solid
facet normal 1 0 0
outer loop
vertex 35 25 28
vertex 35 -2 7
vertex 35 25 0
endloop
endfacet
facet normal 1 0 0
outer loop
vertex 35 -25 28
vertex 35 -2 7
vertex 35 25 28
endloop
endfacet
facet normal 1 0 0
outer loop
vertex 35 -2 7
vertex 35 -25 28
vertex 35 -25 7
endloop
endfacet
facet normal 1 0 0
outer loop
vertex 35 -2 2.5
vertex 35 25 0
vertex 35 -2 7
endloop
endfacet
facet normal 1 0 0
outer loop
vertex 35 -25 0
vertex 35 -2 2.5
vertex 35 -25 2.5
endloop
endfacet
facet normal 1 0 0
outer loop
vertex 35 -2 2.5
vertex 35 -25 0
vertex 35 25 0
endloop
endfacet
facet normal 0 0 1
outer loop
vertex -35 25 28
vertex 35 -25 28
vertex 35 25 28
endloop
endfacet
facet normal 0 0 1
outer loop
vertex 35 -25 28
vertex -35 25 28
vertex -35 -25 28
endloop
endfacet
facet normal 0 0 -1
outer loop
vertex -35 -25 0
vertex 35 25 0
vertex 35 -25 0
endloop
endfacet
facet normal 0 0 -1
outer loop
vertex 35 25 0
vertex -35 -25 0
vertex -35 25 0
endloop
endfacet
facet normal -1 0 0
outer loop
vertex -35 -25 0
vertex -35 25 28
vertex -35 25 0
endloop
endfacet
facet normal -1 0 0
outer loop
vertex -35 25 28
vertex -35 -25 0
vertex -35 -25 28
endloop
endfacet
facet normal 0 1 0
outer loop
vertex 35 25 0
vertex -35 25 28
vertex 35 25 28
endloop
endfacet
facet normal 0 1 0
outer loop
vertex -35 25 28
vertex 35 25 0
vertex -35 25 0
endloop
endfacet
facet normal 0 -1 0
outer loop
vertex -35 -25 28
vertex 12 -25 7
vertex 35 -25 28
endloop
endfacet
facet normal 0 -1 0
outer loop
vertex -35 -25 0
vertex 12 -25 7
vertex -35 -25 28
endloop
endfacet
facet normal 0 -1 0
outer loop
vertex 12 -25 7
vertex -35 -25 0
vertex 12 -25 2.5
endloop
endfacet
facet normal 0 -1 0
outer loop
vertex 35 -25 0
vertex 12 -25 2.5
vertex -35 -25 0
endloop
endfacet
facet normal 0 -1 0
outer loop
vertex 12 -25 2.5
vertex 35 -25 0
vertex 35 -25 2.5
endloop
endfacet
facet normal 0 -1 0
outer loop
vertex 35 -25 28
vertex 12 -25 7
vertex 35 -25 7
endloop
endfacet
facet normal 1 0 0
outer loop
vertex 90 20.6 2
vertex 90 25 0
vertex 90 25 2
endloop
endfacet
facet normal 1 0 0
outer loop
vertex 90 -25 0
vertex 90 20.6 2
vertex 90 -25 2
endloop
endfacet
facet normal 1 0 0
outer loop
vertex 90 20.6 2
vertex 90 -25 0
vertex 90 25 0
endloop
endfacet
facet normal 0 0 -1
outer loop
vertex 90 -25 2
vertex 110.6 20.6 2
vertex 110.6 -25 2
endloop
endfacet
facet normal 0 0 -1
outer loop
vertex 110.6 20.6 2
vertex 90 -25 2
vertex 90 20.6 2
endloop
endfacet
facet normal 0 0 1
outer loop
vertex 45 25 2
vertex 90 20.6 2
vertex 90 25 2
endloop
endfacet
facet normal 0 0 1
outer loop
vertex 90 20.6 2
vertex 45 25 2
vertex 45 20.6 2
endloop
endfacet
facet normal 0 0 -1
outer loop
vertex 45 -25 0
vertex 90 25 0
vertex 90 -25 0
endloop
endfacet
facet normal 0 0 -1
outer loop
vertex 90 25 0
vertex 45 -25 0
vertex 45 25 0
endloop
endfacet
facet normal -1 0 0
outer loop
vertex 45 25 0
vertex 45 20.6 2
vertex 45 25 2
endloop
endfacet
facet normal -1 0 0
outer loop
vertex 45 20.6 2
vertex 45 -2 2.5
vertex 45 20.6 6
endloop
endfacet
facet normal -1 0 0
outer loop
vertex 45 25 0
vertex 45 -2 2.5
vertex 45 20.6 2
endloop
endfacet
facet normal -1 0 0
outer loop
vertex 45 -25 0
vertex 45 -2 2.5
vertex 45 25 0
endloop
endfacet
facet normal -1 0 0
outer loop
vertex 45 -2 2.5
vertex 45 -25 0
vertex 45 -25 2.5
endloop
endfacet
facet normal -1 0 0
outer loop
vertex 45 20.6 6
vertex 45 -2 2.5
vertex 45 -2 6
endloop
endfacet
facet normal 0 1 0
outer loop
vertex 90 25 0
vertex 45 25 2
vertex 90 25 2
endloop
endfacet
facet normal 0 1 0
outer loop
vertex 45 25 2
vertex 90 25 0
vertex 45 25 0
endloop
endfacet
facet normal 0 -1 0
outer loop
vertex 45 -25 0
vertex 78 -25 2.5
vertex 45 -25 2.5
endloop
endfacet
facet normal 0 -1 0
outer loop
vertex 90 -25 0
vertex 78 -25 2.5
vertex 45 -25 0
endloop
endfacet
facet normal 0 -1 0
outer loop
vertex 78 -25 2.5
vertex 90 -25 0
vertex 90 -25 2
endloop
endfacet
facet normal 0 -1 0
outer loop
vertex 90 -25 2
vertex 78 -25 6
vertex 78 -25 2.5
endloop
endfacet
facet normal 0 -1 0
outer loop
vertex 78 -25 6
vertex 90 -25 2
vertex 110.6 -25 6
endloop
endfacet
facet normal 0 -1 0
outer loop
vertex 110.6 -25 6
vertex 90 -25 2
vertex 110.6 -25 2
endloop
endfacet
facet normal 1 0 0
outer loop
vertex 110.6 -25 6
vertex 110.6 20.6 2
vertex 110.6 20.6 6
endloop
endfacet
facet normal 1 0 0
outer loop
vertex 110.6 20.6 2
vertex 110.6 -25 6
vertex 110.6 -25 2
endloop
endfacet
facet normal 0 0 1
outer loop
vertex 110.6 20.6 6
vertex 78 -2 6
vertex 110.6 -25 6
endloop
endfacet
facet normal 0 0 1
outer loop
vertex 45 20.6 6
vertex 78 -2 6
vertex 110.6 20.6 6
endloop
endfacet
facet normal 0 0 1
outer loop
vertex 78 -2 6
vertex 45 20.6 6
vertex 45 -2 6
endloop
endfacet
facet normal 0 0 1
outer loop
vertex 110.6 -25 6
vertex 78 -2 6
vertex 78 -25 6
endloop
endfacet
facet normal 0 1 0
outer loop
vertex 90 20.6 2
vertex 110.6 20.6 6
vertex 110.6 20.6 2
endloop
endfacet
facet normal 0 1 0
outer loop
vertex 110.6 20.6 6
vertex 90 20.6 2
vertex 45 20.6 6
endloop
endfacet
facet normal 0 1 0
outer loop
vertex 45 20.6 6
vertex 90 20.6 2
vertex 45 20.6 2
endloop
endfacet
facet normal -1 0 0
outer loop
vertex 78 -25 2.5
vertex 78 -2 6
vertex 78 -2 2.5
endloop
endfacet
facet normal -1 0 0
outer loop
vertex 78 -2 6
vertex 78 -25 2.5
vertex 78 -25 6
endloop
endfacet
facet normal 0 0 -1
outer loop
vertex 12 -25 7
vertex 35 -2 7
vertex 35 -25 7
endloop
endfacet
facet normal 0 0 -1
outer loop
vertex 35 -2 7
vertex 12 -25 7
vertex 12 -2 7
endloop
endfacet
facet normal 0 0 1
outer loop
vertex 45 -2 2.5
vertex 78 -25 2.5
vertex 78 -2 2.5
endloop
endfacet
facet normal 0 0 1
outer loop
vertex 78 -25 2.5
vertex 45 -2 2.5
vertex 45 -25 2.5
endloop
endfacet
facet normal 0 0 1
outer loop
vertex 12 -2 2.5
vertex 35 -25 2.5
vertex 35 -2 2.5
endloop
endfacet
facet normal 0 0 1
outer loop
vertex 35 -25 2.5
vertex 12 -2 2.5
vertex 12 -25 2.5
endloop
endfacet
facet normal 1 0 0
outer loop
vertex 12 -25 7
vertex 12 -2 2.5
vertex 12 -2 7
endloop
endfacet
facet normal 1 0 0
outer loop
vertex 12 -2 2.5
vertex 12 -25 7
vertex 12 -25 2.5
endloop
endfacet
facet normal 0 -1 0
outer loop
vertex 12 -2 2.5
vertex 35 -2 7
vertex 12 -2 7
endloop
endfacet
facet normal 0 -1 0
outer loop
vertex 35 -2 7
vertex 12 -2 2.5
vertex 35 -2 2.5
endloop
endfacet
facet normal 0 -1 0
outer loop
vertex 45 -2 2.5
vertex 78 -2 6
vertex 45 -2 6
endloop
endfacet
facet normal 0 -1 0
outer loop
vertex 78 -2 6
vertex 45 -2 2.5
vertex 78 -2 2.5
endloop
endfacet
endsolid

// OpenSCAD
// Two-part enclosure for a small electronics board (e.g. Arduino-based temperature logger)
// Print orientation: box upright, lid upside-down. They print together with a 10 mm gap.
// Units: mm

// ---------------- Parameters ----------------
box_x      = 70;    // box outer length (X)
box_y      = 50;    // box outer width (Y)
box_h      = 30;    // box outer height (Z)
wall       = 2;     // box wall thickness
floor      = 2;     // box floor thickness

lip_t      = 1.5;   // lid lip wall thickness
lip_h      = 4;     // lid lip height (from plate top)
lip_x      = 65.6;  // lip outer length (X)
lip_y      = 45.6;  // lip outer width (Y)
clearance  = 0.2;   // side clearance between lip and box opening

gap        = 10;    // horizontal gap between box and lid during print
eps        = 0.5;   // cutter overshoot past faces

$fn = 64;

// Derived: inner size of box opening
inner_x = box_x - 2 * wall;   // 66
inner_y = box_y - 2 * wall;   // 46

// ---------------- Model ----------------
difference() {
    union() {
        // Part 1: Box (open top)
        translate([-box_x / 2, -box_y / 2, 0])
            cube([box_x, box_y, box_h - floor]);   // floor included in height

        // Part 2: Lid (plate + centred lip), printed upside-down
        translate([box_x / 2 + gap, -box_y / 2, 0])
            cube([box_x / 2 + gap, box_y, 2]);                          // plate (2 mm thick)
        translate([box_x / 2 + gap, -box_y / 2, 2])
            cube([lip_x, lip_y, lip_h]);                                 // lip on plate
    }

    // Notch the lip so it slides into the box opening with the specified clearance
    translate([box_x / 2 + gap - lip_x / 2 - clearance,
                -box_y / 2 - lip_y / 2 - clearance,
                2 + eps])
        cube([lip_x + 2 * clearance,
              lip_y + 2 * clearance,
              lip_h + eps]);
}
